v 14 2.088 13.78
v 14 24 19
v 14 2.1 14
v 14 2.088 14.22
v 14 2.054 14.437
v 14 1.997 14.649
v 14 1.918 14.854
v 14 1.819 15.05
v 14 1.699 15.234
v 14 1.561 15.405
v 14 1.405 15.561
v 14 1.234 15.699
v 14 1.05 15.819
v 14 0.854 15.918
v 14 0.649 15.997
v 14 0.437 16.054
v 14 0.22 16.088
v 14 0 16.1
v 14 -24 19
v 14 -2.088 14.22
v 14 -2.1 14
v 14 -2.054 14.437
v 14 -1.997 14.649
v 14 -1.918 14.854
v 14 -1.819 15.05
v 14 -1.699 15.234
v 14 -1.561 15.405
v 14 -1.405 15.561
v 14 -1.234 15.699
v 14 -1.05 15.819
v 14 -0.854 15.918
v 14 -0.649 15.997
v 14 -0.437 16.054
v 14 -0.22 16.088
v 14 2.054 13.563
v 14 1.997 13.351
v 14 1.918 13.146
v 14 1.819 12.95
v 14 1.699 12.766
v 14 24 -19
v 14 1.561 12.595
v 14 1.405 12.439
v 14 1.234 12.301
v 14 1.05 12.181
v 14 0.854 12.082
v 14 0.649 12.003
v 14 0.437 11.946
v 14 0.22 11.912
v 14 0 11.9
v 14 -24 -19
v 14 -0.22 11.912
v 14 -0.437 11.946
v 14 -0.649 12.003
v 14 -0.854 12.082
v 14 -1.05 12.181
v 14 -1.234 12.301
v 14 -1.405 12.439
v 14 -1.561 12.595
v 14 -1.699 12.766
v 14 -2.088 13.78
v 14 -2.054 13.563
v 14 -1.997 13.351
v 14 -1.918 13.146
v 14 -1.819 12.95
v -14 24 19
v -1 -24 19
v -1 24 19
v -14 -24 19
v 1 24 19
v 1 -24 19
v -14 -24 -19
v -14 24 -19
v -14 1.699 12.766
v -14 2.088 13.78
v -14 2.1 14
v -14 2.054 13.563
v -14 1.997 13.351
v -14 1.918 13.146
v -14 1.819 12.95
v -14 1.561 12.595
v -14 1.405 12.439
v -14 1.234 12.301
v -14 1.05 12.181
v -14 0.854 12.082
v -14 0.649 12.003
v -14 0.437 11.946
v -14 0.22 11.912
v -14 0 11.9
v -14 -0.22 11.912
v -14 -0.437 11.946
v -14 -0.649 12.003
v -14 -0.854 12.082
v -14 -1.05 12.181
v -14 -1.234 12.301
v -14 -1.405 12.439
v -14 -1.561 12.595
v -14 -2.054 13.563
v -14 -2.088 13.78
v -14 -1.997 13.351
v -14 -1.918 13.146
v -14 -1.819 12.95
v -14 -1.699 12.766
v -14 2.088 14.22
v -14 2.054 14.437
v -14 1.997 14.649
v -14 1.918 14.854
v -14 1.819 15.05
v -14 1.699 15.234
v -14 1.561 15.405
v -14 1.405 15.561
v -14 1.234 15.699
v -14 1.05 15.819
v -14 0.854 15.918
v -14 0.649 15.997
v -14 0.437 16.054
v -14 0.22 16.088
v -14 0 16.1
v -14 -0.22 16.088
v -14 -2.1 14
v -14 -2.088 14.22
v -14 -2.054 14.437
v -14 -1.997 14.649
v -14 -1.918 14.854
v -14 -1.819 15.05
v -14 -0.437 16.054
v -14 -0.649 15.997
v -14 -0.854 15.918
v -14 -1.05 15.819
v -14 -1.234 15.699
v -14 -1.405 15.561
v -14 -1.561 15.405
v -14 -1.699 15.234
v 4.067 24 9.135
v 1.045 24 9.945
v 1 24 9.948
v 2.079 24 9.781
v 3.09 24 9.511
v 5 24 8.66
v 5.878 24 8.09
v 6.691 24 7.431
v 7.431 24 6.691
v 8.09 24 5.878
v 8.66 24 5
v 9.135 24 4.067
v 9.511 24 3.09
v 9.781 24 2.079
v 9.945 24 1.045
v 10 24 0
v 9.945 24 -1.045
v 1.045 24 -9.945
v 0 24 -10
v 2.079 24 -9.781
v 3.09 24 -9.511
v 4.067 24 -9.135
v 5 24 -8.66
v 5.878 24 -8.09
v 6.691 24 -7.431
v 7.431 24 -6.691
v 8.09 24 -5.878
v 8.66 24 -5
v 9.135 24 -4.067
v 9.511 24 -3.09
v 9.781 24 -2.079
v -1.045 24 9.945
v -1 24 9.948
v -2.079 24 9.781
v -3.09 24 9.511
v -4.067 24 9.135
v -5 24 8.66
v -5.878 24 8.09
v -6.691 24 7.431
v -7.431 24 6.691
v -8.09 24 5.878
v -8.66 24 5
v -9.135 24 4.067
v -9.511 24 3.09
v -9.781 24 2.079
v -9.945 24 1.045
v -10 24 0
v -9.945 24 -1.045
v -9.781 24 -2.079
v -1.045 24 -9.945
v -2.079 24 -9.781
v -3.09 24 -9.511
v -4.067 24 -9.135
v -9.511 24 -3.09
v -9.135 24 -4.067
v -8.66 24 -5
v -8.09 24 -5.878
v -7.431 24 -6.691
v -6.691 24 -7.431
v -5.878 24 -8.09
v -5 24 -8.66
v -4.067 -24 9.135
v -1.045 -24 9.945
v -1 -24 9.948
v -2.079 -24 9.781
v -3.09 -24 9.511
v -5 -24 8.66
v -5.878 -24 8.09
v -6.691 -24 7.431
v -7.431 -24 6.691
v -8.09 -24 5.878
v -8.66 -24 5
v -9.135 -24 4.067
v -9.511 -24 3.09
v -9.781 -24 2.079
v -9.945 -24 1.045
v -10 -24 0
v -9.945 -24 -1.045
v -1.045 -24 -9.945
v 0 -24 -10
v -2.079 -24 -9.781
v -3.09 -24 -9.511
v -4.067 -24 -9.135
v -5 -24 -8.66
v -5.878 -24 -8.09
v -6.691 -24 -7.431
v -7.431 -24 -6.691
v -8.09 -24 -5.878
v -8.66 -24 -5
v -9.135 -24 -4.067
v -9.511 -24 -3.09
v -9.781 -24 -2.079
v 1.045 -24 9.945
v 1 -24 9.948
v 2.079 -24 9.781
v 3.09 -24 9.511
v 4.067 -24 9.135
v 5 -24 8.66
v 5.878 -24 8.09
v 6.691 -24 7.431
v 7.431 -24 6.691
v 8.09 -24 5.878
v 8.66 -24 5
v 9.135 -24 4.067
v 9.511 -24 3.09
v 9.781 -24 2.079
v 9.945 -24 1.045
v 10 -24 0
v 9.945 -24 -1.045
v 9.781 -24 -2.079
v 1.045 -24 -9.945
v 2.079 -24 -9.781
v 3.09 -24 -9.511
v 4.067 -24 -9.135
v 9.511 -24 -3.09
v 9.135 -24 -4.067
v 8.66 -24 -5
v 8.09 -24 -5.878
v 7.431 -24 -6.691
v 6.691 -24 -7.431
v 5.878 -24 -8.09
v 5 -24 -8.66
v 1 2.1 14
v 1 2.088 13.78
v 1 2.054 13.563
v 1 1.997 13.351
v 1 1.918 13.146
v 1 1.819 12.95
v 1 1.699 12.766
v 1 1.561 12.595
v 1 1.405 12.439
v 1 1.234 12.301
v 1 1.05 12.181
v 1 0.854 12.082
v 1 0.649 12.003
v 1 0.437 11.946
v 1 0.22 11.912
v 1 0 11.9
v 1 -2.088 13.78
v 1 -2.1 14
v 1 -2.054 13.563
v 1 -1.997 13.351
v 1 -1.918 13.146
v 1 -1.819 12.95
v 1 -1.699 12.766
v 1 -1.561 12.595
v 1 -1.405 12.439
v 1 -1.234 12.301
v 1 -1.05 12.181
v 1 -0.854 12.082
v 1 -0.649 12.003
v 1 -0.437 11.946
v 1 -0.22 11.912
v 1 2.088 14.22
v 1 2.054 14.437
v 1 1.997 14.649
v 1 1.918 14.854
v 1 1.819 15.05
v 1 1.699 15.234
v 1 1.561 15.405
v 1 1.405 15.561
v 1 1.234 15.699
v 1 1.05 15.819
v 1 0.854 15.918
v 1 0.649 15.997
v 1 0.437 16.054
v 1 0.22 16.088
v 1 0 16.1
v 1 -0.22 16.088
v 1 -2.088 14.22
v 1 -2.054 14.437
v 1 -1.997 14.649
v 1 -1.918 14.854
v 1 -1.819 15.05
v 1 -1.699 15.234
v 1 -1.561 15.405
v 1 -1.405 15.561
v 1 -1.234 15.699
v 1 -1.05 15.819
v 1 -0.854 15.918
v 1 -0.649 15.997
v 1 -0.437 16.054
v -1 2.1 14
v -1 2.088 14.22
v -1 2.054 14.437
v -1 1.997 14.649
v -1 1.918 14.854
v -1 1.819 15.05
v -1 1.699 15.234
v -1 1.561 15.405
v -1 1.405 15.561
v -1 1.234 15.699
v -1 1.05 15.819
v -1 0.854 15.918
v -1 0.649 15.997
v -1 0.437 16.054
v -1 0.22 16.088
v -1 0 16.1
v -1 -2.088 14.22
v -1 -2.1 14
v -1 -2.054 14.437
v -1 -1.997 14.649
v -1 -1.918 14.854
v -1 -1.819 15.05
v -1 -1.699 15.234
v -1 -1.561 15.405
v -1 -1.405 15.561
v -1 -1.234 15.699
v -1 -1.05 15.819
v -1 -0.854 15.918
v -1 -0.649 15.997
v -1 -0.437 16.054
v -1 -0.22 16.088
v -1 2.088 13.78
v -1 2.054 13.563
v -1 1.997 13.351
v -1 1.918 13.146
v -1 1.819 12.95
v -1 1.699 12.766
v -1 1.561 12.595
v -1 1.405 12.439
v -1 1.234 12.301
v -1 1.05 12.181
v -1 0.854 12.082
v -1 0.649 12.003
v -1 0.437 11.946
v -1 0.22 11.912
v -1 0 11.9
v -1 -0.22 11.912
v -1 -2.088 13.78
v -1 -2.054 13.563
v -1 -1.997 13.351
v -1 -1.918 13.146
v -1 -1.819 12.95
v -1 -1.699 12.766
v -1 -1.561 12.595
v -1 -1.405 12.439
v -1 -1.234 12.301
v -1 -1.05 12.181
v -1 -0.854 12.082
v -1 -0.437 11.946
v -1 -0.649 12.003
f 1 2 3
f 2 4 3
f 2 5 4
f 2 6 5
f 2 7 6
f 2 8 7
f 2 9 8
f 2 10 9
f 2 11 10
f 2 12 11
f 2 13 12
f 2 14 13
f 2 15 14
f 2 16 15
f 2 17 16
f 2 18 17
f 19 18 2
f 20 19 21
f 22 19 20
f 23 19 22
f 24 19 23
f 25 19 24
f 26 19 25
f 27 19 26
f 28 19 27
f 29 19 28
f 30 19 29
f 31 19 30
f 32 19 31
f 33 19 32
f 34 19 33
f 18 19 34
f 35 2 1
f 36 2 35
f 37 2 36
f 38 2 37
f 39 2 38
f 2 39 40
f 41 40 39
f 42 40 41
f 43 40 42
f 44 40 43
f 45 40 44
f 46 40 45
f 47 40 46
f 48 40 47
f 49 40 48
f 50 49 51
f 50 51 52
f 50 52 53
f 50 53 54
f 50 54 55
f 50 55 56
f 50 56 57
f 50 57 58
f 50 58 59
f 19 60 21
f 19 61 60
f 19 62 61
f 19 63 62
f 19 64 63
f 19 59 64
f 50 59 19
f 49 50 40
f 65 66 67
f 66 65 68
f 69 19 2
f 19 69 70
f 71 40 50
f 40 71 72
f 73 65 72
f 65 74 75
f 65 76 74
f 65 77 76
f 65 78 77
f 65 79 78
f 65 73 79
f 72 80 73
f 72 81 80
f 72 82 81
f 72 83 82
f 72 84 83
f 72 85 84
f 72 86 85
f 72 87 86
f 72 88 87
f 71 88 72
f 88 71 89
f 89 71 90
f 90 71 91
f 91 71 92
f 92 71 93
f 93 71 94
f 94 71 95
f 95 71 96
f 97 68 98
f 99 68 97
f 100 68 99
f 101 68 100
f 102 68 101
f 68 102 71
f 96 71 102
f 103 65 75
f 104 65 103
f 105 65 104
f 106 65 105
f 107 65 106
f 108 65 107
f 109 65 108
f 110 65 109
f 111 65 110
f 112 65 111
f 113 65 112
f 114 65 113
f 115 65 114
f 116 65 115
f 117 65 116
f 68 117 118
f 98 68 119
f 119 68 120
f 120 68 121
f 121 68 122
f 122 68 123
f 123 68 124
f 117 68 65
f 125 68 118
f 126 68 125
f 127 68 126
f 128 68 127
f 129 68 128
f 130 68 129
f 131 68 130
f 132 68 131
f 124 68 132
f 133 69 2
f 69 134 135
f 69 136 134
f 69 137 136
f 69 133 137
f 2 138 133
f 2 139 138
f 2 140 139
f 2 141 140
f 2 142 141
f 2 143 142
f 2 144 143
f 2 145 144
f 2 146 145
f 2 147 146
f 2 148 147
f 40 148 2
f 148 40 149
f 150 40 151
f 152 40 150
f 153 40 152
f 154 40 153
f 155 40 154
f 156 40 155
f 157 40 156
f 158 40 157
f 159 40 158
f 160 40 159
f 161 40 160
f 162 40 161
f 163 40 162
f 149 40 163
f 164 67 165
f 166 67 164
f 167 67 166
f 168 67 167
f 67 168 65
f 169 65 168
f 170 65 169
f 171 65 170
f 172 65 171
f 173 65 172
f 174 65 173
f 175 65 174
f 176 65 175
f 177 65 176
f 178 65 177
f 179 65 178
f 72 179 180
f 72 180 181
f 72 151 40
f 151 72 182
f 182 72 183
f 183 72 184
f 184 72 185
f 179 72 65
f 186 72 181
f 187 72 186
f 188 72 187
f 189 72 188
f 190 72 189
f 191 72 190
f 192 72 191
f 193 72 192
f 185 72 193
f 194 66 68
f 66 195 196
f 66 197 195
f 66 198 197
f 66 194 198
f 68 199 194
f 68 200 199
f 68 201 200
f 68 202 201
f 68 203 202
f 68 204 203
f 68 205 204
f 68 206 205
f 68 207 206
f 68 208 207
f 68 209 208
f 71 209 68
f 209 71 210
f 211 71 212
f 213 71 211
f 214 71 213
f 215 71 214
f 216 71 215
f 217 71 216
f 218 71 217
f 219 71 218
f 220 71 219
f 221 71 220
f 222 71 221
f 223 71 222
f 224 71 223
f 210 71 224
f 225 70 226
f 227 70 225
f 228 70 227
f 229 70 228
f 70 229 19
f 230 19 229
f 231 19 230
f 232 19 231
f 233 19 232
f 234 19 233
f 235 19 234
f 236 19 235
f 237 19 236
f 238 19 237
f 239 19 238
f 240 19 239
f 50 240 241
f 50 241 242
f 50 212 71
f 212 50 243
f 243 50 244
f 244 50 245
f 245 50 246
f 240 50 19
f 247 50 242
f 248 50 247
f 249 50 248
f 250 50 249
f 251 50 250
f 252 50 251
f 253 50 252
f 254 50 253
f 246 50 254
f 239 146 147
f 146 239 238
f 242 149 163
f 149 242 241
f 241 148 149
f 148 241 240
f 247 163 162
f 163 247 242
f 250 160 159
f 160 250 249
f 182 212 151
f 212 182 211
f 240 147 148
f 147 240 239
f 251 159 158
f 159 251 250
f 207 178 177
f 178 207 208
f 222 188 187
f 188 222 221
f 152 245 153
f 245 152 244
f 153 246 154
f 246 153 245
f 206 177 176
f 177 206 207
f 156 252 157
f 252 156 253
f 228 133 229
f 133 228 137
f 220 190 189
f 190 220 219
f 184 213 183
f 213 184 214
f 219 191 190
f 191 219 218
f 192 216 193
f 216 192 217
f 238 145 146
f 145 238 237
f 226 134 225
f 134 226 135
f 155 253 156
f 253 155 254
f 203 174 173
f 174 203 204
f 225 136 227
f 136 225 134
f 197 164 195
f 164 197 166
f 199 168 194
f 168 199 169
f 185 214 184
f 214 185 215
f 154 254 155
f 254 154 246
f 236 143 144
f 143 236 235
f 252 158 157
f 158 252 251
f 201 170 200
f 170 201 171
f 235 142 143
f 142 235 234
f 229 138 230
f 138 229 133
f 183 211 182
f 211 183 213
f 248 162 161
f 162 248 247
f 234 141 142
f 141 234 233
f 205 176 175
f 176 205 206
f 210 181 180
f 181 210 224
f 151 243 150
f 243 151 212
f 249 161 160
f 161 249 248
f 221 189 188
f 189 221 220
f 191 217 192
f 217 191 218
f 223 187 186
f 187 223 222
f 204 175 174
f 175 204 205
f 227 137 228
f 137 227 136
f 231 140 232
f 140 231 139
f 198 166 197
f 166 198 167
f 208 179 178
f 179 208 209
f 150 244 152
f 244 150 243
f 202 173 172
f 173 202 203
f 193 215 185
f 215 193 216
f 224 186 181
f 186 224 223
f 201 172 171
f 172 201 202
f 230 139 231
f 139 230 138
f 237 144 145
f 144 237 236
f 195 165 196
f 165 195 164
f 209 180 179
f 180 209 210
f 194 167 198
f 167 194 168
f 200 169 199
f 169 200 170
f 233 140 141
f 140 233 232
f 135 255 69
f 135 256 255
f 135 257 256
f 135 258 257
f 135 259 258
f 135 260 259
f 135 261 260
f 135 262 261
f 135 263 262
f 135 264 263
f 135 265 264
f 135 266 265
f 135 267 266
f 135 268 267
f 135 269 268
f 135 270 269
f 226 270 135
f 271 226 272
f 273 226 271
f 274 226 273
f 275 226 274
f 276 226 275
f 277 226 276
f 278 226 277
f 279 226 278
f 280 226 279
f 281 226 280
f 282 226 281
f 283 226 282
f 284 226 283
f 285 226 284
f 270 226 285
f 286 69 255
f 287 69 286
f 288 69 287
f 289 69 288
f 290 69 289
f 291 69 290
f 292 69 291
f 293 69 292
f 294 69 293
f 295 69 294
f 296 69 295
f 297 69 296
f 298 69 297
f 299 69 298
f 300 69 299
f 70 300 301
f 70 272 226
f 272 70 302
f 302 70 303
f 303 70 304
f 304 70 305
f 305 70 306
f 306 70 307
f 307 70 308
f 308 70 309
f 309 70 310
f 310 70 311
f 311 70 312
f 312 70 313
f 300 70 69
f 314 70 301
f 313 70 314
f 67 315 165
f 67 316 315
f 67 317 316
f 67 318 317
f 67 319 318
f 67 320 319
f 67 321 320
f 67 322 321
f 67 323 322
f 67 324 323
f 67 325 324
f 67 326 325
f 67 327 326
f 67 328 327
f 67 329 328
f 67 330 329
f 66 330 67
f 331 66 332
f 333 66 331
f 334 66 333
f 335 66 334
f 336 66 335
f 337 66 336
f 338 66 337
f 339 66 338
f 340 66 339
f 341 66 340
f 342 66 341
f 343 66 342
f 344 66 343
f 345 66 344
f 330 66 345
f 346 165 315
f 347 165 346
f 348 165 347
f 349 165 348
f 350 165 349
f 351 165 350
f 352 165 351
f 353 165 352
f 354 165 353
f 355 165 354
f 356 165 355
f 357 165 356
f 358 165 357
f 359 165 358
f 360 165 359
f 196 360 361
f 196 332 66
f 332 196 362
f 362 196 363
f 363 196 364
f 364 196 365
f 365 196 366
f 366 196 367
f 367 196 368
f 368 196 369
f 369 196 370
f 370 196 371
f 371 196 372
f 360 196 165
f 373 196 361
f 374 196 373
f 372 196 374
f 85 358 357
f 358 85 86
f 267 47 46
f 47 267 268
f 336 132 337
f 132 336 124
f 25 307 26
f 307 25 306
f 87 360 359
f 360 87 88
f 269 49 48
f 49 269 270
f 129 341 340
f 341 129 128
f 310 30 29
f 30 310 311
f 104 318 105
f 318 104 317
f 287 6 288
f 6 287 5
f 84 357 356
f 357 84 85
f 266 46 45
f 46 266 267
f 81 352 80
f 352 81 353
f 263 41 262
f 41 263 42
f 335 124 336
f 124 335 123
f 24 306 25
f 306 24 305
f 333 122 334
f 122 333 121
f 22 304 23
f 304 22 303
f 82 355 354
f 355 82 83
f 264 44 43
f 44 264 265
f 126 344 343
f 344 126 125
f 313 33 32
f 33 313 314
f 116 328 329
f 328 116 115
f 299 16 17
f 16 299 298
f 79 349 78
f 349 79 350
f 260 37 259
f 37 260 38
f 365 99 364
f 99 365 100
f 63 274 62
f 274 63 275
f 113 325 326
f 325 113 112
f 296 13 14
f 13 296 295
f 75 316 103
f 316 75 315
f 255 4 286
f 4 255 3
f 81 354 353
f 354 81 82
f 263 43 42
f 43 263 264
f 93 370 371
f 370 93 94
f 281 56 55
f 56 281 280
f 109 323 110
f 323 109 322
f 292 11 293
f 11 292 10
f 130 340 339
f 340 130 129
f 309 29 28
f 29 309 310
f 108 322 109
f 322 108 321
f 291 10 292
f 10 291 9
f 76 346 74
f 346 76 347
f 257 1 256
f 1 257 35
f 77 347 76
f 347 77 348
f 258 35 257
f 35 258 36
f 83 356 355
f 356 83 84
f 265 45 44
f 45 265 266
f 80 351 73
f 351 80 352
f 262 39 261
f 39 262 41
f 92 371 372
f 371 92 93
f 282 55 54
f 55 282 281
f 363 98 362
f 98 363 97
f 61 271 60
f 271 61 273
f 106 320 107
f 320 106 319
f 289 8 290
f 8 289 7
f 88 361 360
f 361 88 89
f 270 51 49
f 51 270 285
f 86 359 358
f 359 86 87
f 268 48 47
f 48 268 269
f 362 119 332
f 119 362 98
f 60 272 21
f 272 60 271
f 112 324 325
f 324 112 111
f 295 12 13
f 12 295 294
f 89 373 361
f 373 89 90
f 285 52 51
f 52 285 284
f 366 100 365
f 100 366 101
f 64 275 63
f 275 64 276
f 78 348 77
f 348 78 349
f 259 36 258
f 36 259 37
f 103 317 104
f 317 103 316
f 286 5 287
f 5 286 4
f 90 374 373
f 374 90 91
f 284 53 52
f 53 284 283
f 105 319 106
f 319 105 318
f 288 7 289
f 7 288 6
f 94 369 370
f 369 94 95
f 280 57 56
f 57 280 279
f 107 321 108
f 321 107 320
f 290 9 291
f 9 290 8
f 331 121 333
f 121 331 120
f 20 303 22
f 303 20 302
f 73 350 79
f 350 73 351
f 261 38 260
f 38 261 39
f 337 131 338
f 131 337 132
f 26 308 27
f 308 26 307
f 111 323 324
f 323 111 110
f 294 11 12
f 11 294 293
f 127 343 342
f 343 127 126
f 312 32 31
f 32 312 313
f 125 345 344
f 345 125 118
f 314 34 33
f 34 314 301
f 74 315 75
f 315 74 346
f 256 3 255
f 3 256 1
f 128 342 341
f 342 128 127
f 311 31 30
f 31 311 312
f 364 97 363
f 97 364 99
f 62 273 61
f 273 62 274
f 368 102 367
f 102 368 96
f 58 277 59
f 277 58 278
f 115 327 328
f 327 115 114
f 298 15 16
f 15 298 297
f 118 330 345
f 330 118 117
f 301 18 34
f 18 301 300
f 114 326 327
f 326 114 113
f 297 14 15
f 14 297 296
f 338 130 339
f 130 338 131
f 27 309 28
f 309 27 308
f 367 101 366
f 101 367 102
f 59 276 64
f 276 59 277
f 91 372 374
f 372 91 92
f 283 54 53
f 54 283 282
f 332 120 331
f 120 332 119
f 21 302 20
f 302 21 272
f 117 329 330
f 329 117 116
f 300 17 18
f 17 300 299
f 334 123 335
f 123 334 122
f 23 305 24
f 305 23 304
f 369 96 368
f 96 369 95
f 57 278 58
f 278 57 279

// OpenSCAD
// Split clamp block.
$fn = 60;
eps = 0.02;
bore_d = 20;
body_w = 48;
body_h = 38;
body_l = 28;
slot_w = 2;
difference() {
    cube([body_l, body_w, body_h], center = true);
    translate([0, -body_w / 2 - eps, 0]) rotate([-90,0,0]) cylinder(d = bore_d, h = body_w + 2 * eps);
    translate([-slot_w / 2, -body_w / 2 - eps, 0]) cube([slot_w, body_w + 2 * eps, body_h / 2 + eps]);
    translate([-body_l / 2 - eps, 0, body_h / 2 - 5]) rotate([0,90,0]) cylinder(d = 4.2, h = body_l + 2 * eps);
}
